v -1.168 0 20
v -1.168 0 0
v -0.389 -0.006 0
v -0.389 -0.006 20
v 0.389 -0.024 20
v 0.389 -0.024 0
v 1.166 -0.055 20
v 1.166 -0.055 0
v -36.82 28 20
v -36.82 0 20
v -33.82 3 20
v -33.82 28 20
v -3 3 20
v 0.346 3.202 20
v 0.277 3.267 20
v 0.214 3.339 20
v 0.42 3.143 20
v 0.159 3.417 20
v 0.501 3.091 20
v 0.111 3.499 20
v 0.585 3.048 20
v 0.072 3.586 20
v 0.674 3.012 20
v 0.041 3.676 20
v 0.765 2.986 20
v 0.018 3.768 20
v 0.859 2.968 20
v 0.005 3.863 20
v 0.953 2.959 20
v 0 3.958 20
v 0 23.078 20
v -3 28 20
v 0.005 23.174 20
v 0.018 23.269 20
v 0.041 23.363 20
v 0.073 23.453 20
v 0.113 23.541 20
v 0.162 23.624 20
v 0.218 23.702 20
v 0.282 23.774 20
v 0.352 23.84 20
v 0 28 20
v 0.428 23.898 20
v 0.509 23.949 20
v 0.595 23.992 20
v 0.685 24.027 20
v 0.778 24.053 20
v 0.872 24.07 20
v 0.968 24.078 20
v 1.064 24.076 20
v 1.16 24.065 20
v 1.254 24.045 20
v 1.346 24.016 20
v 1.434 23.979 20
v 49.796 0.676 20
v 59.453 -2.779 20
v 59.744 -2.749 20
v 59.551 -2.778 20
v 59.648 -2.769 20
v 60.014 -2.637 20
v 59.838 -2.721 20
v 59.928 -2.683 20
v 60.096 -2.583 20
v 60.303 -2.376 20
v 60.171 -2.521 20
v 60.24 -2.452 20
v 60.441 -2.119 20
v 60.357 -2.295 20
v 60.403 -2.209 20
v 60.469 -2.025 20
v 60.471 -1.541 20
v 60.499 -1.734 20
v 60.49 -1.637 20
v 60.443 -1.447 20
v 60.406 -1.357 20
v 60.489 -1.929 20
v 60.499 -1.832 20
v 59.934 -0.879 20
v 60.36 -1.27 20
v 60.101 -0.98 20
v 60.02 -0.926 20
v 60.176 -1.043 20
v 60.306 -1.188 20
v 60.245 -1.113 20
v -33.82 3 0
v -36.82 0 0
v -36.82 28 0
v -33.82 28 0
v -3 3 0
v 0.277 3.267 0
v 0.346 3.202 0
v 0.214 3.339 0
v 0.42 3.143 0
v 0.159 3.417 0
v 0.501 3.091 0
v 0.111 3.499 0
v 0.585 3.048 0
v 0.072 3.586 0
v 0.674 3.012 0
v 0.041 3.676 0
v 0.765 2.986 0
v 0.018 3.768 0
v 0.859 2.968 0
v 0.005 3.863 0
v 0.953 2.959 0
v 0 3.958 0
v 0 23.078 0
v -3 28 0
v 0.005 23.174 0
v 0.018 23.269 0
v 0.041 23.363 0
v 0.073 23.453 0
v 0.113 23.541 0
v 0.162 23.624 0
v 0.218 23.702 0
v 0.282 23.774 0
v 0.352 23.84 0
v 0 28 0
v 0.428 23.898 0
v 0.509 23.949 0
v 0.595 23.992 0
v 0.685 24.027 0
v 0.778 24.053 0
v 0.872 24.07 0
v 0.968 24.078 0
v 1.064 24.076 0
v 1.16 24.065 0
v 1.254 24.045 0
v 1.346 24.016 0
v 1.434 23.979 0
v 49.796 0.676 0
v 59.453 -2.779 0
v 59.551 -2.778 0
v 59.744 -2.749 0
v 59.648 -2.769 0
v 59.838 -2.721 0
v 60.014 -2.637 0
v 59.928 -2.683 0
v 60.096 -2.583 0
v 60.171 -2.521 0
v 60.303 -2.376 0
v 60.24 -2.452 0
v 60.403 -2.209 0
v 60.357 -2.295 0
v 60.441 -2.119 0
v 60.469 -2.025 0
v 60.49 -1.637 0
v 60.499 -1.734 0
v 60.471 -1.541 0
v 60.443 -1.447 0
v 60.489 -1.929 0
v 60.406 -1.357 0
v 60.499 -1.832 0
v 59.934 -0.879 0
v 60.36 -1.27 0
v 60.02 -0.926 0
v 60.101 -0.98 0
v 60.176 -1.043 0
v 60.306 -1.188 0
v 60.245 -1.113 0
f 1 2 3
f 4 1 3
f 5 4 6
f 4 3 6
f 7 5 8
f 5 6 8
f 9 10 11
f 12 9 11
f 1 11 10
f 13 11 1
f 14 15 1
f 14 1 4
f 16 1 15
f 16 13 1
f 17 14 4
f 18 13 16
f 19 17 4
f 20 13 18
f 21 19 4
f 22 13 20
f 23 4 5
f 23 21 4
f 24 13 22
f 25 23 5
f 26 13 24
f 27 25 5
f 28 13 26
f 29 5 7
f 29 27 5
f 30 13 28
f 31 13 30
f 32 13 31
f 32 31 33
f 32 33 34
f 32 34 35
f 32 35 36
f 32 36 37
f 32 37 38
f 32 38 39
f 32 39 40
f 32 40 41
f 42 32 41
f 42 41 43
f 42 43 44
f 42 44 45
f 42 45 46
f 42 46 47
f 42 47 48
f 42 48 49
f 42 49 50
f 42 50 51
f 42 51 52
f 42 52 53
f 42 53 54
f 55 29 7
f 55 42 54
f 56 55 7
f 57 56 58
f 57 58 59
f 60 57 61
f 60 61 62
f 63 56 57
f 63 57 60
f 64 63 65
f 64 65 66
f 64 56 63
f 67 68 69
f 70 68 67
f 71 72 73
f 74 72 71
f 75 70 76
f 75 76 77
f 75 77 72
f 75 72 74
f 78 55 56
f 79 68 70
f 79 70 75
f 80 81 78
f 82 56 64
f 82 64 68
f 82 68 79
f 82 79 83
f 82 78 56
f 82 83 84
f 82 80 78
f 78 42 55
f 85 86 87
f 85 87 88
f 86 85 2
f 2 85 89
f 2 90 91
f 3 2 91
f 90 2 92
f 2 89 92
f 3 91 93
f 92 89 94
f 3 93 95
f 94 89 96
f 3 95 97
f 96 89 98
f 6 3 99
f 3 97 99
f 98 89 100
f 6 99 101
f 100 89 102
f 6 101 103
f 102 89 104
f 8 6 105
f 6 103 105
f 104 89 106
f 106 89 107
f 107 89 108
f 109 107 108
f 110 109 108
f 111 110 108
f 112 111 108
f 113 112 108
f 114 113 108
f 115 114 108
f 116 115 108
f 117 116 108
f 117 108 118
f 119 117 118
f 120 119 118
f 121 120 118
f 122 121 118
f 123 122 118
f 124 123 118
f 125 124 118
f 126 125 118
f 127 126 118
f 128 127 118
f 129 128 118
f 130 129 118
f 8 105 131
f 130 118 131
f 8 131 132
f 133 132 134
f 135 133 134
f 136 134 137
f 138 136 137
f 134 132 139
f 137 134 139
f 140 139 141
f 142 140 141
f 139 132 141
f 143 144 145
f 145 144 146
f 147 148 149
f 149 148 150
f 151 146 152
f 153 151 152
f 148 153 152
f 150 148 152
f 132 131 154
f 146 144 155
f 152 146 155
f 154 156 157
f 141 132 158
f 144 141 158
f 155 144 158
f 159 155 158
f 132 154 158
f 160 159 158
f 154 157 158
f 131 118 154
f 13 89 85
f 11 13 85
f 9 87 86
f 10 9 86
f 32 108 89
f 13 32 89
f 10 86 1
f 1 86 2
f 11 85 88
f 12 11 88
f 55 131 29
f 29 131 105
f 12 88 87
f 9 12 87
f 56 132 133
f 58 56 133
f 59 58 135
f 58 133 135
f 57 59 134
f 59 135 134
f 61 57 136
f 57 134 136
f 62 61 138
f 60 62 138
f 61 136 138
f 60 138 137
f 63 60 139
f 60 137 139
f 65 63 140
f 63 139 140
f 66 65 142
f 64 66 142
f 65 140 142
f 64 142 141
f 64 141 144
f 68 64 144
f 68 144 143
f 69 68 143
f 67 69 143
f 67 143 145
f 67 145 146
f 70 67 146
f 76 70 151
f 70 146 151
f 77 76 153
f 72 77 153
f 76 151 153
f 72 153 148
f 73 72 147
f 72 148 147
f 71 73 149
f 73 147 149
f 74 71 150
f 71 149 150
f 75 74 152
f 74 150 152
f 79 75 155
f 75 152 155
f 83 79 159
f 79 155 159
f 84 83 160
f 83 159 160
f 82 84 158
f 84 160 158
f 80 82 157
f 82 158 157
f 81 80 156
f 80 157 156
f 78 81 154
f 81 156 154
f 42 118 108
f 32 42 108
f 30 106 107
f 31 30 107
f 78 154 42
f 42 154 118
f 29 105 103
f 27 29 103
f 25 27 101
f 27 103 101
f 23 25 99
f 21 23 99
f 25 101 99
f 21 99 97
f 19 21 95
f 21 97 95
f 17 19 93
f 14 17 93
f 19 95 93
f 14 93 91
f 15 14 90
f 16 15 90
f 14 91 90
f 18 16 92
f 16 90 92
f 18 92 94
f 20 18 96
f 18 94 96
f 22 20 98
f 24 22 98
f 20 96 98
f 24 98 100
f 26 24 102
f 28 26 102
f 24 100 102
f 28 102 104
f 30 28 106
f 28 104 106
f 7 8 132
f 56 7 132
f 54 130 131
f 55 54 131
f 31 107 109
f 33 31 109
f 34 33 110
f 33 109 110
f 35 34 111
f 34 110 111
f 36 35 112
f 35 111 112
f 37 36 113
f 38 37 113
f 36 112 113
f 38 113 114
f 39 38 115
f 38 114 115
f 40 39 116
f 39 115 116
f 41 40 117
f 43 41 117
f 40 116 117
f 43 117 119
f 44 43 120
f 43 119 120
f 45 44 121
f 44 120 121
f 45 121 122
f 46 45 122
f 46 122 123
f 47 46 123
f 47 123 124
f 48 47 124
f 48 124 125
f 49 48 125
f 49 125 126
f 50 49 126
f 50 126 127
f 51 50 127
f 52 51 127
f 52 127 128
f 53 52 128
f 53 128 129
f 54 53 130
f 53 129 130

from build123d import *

# Parameters (mm, degrees)
F2_DEPTH = 20


with BuildPart() as f2:
    # F1 (on Top) → F2 (new body)
    with BuildSketch(Plane.XY):
        with BuildLine():
            Line((-36.82, 0), (-1.1677719632, 0))
            ThreePointArc((-1.1677719632, 0), (-0.0003183659, -0.0136313372), (1.1664986733, -0.0545179161))
            Line((1.1664986733, -0.0545179161), (59.4533145873, -2.7786322345))
            ThreePointArc((59.4533145873, -2.7786322345), (60.4694396966, -2.0250523194), (59.9340803732, -0.8788484453))
            Line((59.9340803732, -0.8788484453), (0, 28))
            Line((0, 28), (-3, 28))
            Line((-3, 28), (-3, 3))
            Line((-3, 3), (-33.82, 3))
            Line((-33.82, 3), (-33.82, 28))
            Line((-33.82, 28), (-36.82, 28))
            Line((-36.82, 28), (-36.82, 0))
        make_face()
        with BuildLine():
            ThreePointArc((0.9533145873, 2.9587201802), (0.2765757079, 3.267226104), (0, 3.9576298219))
            Line((0, 3.9576298219), (0, 23.0780246214))
            ThreePointArc((0, 23.0780246214), (0.4680603292, 23.924806876), (1.4340803732, 23.9788987689))
            Line((1.4340803732, 23.9788987689), (49.7960707162, 0.6759869543))
            Line((49.7960707162, 0.6759869543), (0.9533145873, 2.9587201802))
        make_face(mode=Mode.SUBTRACT)
    extrude(amount=F2_DEPTH)


solid = f2.part
